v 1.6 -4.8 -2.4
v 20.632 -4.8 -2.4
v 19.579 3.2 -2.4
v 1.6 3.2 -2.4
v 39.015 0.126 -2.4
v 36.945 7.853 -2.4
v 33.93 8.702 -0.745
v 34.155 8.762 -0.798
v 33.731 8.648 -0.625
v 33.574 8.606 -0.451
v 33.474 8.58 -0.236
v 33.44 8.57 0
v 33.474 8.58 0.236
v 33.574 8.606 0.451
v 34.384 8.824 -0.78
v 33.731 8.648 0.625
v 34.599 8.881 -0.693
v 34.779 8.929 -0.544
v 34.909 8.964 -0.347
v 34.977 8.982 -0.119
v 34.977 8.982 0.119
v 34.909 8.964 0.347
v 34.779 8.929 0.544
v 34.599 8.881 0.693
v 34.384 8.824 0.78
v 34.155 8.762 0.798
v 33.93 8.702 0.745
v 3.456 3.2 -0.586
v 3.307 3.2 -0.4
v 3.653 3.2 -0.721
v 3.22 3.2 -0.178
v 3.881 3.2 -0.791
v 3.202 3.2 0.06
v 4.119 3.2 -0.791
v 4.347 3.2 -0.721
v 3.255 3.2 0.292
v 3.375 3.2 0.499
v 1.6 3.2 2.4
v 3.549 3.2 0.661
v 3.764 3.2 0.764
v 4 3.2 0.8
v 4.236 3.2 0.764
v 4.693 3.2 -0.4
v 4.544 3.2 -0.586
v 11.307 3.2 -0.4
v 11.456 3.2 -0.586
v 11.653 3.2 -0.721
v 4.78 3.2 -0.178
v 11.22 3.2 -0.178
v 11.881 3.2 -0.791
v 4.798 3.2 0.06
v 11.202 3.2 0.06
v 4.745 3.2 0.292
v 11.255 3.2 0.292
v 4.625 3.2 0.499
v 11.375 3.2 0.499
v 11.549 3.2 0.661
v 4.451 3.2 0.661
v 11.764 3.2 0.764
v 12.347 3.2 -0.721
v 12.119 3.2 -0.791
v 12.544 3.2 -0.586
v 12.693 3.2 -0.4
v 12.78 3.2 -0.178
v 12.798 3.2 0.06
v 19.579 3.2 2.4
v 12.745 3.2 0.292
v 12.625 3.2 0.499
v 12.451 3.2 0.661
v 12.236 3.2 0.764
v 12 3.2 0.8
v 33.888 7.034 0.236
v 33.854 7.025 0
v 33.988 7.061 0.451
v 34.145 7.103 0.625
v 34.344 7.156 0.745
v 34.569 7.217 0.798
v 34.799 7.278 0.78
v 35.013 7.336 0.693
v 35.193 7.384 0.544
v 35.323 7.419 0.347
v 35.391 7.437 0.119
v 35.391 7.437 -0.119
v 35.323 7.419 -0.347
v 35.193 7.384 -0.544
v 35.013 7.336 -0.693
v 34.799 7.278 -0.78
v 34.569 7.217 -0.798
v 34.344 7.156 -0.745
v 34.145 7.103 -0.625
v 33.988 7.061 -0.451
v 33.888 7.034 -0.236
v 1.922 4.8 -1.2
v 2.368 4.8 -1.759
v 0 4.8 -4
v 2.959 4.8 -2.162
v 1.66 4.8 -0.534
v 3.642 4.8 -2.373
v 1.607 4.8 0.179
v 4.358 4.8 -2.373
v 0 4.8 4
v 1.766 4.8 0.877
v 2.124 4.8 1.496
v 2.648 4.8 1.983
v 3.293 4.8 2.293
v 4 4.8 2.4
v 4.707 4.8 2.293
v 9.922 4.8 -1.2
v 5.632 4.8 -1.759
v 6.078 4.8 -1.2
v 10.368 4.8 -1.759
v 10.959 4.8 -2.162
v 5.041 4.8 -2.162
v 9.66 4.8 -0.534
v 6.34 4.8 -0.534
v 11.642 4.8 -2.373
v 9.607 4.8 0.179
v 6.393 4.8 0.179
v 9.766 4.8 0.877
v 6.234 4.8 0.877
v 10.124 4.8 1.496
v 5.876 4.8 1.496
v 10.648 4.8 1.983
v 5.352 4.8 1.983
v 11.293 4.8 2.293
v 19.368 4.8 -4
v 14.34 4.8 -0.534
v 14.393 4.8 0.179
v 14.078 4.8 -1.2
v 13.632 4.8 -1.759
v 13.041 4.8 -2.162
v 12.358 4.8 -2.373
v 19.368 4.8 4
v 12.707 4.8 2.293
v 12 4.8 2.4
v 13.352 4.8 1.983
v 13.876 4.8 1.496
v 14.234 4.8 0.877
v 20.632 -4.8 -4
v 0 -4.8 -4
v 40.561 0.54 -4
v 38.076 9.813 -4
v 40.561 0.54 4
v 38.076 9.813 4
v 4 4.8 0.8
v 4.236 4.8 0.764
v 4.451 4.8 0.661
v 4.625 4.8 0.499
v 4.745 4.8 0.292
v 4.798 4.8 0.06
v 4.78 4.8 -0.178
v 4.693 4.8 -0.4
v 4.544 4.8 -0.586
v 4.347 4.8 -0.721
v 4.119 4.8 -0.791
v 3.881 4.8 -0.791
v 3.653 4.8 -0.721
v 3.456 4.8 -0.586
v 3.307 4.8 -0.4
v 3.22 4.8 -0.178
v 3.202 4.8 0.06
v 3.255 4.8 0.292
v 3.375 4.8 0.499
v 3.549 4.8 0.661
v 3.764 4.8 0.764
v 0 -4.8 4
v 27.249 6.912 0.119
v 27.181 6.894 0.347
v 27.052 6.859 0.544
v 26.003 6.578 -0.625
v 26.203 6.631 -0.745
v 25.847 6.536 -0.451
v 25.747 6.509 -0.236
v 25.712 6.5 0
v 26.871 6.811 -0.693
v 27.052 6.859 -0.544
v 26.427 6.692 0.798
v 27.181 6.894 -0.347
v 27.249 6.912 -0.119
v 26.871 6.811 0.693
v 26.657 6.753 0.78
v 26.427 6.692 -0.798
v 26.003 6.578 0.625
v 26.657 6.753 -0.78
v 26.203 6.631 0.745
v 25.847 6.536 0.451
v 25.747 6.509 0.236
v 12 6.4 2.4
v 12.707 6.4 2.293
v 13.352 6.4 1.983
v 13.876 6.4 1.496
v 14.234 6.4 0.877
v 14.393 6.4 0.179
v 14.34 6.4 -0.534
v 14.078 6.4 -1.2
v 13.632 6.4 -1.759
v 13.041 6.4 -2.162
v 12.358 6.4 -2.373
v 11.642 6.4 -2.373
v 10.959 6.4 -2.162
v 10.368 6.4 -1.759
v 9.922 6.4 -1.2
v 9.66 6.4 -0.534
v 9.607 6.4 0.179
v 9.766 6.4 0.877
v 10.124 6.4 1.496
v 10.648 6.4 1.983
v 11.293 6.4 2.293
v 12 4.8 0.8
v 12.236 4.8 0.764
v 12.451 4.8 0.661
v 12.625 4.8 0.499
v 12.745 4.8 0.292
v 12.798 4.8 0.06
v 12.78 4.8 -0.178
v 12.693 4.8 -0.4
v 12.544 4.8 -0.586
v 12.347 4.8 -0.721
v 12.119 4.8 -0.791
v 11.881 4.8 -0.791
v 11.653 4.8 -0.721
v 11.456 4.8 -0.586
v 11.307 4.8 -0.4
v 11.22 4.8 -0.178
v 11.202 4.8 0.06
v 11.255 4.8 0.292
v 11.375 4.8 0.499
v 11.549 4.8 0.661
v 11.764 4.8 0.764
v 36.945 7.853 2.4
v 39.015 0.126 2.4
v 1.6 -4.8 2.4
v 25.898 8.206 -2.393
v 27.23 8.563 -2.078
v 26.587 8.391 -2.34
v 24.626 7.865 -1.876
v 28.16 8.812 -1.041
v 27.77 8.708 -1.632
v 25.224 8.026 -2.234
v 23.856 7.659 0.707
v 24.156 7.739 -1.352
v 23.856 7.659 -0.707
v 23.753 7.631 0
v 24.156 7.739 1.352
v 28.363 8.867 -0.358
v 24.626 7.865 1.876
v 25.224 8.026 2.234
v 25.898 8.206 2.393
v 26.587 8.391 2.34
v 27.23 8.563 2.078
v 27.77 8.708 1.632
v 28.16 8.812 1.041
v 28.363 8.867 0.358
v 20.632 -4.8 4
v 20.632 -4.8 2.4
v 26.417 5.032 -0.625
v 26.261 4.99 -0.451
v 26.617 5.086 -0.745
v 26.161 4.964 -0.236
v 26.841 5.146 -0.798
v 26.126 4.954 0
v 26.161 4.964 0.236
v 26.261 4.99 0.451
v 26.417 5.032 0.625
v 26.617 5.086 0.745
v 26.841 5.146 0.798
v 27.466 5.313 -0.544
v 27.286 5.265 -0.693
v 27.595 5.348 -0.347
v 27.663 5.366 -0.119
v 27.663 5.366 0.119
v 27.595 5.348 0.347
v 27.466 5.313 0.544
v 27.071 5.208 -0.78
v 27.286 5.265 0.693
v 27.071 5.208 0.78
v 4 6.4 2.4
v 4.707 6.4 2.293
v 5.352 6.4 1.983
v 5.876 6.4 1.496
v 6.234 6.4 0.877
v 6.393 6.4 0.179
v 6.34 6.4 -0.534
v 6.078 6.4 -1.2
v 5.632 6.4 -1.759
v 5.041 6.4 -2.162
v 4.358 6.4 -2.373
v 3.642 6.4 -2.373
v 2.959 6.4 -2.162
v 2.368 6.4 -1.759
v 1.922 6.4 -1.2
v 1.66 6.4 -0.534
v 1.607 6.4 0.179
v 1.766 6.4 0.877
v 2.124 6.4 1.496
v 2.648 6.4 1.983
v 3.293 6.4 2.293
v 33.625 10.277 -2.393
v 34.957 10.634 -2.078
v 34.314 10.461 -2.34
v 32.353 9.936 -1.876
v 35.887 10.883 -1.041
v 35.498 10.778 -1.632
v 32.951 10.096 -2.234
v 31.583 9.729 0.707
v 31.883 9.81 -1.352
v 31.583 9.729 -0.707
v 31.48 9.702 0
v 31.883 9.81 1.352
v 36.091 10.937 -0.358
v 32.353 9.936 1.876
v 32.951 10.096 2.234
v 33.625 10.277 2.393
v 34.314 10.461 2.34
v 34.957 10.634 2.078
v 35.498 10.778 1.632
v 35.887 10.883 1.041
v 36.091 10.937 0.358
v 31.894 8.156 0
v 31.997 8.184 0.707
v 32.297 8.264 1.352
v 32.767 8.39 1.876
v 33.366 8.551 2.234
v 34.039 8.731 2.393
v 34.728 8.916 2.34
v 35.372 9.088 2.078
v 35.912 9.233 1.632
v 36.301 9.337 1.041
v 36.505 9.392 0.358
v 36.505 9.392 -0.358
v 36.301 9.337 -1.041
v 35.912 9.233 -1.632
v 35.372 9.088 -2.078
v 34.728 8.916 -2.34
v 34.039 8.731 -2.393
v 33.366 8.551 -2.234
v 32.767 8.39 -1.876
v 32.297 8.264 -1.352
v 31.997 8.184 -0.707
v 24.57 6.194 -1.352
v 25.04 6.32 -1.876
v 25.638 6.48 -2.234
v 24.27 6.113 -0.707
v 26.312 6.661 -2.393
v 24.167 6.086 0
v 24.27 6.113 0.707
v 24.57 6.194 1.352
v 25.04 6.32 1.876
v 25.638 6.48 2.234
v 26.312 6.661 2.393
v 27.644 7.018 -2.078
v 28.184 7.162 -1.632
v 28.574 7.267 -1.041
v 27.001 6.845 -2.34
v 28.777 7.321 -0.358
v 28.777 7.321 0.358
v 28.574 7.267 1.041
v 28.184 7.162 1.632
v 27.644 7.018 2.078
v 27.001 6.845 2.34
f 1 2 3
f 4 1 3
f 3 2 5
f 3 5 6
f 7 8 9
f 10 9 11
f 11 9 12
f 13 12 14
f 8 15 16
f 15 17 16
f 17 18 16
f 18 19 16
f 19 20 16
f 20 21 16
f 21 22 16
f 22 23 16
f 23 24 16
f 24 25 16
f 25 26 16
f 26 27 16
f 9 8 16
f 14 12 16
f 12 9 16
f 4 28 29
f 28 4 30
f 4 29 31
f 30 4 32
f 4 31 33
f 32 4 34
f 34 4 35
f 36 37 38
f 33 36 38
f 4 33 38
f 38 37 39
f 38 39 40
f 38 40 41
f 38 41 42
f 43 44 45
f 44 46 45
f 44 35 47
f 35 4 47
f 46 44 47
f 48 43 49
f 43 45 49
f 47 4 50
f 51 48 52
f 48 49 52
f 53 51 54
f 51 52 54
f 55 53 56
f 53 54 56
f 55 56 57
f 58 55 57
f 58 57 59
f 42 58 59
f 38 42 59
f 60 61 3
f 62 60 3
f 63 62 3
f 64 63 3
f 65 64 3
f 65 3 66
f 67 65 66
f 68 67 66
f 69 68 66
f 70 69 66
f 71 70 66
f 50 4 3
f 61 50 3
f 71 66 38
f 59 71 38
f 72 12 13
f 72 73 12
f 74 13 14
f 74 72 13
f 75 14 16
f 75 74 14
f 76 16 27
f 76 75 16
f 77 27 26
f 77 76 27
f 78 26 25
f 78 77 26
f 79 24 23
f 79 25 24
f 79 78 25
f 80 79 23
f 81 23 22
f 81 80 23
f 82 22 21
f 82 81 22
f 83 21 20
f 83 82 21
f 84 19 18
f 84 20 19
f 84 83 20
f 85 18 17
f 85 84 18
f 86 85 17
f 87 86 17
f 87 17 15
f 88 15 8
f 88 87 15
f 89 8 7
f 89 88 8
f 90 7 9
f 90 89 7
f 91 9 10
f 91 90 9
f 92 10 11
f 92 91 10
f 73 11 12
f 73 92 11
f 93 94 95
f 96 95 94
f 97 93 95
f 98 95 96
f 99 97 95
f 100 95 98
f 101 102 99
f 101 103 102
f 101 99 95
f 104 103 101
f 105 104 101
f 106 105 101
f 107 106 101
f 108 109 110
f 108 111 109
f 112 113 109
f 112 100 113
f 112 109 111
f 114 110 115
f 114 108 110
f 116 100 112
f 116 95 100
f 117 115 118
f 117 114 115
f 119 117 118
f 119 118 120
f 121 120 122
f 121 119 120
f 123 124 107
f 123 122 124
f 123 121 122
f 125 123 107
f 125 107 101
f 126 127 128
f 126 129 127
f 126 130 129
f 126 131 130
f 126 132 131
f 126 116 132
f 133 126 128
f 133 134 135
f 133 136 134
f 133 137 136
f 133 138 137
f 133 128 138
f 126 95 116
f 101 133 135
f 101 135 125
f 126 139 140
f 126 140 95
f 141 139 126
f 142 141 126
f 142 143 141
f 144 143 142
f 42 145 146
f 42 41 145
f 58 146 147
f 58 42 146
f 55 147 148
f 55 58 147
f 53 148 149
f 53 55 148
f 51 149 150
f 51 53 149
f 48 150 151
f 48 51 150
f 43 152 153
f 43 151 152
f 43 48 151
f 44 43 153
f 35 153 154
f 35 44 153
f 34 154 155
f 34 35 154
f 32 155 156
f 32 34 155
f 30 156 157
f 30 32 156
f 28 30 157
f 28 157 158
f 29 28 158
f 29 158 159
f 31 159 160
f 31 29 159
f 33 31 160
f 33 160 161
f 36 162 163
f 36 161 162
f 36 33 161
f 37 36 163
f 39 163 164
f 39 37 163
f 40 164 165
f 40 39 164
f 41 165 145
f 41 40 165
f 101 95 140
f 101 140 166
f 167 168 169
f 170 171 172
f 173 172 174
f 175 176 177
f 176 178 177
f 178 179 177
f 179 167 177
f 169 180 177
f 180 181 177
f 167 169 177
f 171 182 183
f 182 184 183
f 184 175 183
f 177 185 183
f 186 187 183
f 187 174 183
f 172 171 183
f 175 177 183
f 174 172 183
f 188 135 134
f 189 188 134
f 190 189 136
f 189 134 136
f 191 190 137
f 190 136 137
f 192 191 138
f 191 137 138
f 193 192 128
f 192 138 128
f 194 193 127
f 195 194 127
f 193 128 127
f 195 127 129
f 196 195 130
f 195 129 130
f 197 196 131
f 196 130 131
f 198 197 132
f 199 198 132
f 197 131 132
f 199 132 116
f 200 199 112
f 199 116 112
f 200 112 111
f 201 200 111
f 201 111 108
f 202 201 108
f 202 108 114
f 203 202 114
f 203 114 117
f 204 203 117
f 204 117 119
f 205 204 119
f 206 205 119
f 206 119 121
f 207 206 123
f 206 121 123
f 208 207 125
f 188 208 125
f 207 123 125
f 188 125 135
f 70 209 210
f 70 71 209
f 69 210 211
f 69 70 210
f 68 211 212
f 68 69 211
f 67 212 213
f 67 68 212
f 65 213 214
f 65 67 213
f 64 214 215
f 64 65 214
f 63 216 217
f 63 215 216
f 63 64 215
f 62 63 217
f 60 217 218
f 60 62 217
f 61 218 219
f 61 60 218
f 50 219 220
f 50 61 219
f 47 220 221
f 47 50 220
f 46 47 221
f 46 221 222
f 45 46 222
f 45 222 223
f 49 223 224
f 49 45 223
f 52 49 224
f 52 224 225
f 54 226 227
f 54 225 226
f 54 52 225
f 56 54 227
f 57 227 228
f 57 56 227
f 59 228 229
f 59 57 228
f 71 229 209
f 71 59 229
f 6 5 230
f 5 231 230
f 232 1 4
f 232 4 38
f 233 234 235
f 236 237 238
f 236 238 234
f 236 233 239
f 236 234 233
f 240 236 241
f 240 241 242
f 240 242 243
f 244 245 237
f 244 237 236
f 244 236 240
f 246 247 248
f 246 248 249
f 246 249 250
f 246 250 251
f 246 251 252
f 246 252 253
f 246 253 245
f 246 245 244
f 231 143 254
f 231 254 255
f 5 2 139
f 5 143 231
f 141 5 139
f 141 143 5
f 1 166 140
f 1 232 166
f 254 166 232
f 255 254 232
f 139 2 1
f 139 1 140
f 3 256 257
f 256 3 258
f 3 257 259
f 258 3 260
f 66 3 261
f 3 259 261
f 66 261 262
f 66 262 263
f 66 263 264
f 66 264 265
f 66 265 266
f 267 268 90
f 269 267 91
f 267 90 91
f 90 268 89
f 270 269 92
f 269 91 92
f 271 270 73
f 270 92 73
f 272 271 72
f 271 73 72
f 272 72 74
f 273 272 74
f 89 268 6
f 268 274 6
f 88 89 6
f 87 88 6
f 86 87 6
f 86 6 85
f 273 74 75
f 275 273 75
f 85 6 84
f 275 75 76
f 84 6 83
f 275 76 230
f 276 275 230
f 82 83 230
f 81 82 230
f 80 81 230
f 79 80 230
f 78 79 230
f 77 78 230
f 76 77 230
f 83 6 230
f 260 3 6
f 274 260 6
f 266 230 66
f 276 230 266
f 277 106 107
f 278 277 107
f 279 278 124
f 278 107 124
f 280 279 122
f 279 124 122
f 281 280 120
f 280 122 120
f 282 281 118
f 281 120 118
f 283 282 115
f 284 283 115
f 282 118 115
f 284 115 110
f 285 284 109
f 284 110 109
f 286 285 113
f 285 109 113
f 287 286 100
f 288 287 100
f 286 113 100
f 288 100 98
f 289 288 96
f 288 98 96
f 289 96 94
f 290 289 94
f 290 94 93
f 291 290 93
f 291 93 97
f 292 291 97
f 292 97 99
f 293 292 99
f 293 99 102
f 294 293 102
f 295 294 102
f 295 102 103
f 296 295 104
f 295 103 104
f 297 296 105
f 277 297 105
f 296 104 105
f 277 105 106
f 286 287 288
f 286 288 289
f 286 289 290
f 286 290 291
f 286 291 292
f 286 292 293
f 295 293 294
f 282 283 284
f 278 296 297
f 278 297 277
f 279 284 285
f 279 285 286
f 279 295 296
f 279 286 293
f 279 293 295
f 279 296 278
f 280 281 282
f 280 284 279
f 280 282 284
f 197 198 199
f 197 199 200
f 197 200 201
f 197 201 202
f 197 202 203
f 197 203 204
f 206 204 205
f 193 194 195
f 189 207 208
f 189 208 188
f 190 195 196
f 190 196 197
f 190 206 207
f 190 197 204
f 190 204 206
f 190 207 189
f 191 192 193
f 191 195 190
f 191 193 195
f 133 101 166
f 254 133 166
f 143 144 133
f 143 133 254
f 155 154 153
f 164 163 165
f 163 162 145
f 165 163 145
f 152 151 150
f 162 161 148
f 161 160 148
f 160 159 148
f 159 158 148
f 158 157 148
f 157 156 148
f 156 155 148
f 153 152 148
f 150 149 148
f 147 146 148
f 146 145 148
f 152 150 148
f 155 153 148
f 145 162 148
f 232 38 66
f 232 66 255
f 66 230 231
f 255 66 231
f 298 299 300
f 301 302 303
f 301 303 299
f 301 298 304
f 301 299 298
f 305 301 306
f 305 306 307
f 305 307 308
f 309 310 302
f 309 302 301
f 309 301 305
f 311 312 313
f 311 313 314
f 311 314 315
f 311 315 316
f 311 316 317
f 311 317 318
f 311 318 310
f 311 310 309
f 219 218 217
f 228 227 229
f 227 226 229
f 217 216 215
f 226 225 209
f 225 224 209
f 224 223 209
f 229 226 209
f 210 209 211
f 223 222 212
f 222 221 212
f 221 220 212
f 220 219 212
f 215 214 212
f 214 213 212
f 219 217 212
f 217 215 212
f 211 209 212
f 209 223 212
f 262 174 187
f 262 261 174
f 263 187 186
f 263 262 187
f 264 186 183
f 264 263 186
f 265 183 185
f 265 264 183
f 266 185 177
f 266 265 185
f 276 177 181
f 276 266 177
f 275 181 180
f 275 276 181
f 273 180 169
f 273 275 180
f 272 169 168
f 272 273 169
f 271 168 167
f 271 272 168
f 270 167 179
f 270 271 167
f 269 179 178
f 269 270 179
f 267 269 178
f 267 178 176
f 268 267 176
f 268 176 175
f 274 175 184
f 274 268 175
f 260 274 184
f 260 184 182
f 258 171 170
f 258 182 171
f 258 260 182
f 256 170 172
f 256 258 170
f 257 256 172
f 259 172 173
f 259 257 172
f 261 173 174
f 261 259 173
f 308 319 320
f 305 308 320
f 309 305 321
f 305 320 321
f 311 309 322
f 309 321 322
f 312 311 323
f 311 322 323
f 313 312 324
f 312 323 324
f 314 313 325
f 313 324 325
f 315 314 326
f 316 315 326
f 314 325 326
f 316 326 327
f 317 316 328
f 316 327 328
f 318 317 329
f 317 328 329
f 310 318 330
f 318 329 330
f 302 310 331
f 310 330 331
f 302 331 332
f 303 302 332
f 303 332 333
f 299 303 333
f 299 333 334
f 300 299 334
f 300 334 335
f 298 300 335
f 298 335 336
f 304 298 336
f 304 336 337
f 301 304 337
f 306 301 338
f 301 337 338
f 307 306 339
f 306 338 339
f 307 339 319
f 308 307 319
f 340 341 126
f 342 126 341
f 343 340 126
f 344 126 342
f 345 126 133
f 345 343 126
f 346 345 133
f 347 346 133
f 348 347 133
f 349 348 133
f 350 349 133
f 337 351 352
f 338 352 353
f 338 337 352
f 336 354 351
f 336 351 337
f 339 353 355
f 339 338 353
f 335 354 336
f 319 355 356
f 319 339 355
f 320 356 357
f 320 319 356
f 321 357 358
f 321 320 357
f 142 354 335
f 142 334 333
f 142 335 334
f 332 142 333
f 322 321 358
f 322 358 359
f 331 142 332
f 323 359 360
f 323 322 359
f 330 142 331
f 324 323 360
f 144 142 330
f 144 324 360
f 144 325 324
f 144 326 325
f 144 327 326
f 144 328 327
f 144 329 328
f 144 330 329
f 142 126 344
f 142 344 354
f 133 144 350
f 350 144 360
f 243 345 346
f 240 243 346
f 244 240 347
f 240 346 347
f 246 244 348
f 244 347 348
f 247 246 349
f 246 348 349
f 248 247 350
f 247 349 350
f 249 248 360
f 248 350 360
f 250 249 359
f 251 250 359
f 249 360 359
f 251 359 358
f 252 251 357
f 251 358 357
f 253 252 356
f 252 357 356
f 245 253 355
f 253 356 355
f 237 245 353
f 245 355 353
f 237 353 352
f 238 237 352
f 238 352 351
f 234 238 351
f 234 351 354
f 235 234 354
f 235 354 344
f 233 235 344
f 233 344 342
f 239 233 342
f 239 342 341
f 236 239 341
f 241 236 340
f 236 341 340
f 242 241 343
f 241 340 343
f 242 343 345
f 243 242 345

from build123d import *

# Parameters (mm, degrees)
SKETCH2_W           = 8
SKETCH2_H           = 9.6
SKETCH4_R           = 2.4
BOSS_EXTRUDE1_DEPTH = 1.6
LPATTERN1_COUNT     = 2
LPATTERN1_PITCH     = 8
SKETCH5_R           = 2.4
BOSS_EXTRUDE2_DEPTH = 1.6
LPATTERN2_COUNT     = 2
LPATTERN2_PITCH     = 8
SHELL1_T            = -1.6


with BuildPart() as part:
    # Sweep1: sweep along a path in Sketch3
    with BuildLine(Plane.XY) as sweep1_path:
        Line((0, 0), (20, 0))
        Line((20, 0), (39.318516526, 5.176380902))
    # Sketch2 → Sweep1 (sweep)
    with BuildSketch(Plane(origin=(0, 0, 0), x_dir=(0, 0, -1), z_dir=(1, 0, 0))):
        Rectangle(SKETCH2_W, SKETCH2_H)
    sweep(path=sweep1_path.line, transition=Transition.RIGHT)

    # Sketch4 → Boss-Extrude1 (add)
    with BuildSketch(Plane(origin=(0, 4.8, 0), x_dir=(1, 0, 0), z_dir=(0, 1, 0))):
        with Locations(Location((4, 0, 0), (0, 0, 270))):
            Circle(SKETCH4_R)
    boss_extrude1 = extrude(amount=BOSS_EXTRUDE1_DEPTH)

    # LPattern1: Boss-Extrude1 ×2
    with Locations(*[(i * LPATTERN1_PITCH, 0, 0) for i in range(1, LPATTERN1_COUNT)]):
        add(boss_extrude1)

    # Sketch5 → Boss-Extrude2 (add)
    with BuildSketch(Plane(origin=(0.097414546, -0.363556034, 0), x_dir=(0.9659258262890681, 0.2588190451025216, 0), z_dir=(-0.2588190451025216, 0.9659258262890681, 0))):
        with Locations(Location((35.318516526, 0, 0), (0, 0, 180))):
            Circle(SKETCH5_R)
    boss_extrude2 = extrude(amount=BOSS_EXTRUDE2_DEPTH)

    # LPattern2: Boss-Extrude2 ×2
    with Locations(*[Vector(-0.9659258262890681, -0.2588190451025219, 0) * (i * LPATTERN2_PITCH) for i in range(1, LPATTERN2_COUNT)]):
        add(boss_extrude2)

    # Shell1
    shell1_openings = [part.faces().sort_by_distance(p)[0] for p in [
        (10.315965994, -4.8, 0),
        (30.596389965, -2.130031532, 0),
    ]]
    offset(amount=SHELL1_T, openings=shell1_openings, kind=Kind.INTERSECTION)


solid = part.part
